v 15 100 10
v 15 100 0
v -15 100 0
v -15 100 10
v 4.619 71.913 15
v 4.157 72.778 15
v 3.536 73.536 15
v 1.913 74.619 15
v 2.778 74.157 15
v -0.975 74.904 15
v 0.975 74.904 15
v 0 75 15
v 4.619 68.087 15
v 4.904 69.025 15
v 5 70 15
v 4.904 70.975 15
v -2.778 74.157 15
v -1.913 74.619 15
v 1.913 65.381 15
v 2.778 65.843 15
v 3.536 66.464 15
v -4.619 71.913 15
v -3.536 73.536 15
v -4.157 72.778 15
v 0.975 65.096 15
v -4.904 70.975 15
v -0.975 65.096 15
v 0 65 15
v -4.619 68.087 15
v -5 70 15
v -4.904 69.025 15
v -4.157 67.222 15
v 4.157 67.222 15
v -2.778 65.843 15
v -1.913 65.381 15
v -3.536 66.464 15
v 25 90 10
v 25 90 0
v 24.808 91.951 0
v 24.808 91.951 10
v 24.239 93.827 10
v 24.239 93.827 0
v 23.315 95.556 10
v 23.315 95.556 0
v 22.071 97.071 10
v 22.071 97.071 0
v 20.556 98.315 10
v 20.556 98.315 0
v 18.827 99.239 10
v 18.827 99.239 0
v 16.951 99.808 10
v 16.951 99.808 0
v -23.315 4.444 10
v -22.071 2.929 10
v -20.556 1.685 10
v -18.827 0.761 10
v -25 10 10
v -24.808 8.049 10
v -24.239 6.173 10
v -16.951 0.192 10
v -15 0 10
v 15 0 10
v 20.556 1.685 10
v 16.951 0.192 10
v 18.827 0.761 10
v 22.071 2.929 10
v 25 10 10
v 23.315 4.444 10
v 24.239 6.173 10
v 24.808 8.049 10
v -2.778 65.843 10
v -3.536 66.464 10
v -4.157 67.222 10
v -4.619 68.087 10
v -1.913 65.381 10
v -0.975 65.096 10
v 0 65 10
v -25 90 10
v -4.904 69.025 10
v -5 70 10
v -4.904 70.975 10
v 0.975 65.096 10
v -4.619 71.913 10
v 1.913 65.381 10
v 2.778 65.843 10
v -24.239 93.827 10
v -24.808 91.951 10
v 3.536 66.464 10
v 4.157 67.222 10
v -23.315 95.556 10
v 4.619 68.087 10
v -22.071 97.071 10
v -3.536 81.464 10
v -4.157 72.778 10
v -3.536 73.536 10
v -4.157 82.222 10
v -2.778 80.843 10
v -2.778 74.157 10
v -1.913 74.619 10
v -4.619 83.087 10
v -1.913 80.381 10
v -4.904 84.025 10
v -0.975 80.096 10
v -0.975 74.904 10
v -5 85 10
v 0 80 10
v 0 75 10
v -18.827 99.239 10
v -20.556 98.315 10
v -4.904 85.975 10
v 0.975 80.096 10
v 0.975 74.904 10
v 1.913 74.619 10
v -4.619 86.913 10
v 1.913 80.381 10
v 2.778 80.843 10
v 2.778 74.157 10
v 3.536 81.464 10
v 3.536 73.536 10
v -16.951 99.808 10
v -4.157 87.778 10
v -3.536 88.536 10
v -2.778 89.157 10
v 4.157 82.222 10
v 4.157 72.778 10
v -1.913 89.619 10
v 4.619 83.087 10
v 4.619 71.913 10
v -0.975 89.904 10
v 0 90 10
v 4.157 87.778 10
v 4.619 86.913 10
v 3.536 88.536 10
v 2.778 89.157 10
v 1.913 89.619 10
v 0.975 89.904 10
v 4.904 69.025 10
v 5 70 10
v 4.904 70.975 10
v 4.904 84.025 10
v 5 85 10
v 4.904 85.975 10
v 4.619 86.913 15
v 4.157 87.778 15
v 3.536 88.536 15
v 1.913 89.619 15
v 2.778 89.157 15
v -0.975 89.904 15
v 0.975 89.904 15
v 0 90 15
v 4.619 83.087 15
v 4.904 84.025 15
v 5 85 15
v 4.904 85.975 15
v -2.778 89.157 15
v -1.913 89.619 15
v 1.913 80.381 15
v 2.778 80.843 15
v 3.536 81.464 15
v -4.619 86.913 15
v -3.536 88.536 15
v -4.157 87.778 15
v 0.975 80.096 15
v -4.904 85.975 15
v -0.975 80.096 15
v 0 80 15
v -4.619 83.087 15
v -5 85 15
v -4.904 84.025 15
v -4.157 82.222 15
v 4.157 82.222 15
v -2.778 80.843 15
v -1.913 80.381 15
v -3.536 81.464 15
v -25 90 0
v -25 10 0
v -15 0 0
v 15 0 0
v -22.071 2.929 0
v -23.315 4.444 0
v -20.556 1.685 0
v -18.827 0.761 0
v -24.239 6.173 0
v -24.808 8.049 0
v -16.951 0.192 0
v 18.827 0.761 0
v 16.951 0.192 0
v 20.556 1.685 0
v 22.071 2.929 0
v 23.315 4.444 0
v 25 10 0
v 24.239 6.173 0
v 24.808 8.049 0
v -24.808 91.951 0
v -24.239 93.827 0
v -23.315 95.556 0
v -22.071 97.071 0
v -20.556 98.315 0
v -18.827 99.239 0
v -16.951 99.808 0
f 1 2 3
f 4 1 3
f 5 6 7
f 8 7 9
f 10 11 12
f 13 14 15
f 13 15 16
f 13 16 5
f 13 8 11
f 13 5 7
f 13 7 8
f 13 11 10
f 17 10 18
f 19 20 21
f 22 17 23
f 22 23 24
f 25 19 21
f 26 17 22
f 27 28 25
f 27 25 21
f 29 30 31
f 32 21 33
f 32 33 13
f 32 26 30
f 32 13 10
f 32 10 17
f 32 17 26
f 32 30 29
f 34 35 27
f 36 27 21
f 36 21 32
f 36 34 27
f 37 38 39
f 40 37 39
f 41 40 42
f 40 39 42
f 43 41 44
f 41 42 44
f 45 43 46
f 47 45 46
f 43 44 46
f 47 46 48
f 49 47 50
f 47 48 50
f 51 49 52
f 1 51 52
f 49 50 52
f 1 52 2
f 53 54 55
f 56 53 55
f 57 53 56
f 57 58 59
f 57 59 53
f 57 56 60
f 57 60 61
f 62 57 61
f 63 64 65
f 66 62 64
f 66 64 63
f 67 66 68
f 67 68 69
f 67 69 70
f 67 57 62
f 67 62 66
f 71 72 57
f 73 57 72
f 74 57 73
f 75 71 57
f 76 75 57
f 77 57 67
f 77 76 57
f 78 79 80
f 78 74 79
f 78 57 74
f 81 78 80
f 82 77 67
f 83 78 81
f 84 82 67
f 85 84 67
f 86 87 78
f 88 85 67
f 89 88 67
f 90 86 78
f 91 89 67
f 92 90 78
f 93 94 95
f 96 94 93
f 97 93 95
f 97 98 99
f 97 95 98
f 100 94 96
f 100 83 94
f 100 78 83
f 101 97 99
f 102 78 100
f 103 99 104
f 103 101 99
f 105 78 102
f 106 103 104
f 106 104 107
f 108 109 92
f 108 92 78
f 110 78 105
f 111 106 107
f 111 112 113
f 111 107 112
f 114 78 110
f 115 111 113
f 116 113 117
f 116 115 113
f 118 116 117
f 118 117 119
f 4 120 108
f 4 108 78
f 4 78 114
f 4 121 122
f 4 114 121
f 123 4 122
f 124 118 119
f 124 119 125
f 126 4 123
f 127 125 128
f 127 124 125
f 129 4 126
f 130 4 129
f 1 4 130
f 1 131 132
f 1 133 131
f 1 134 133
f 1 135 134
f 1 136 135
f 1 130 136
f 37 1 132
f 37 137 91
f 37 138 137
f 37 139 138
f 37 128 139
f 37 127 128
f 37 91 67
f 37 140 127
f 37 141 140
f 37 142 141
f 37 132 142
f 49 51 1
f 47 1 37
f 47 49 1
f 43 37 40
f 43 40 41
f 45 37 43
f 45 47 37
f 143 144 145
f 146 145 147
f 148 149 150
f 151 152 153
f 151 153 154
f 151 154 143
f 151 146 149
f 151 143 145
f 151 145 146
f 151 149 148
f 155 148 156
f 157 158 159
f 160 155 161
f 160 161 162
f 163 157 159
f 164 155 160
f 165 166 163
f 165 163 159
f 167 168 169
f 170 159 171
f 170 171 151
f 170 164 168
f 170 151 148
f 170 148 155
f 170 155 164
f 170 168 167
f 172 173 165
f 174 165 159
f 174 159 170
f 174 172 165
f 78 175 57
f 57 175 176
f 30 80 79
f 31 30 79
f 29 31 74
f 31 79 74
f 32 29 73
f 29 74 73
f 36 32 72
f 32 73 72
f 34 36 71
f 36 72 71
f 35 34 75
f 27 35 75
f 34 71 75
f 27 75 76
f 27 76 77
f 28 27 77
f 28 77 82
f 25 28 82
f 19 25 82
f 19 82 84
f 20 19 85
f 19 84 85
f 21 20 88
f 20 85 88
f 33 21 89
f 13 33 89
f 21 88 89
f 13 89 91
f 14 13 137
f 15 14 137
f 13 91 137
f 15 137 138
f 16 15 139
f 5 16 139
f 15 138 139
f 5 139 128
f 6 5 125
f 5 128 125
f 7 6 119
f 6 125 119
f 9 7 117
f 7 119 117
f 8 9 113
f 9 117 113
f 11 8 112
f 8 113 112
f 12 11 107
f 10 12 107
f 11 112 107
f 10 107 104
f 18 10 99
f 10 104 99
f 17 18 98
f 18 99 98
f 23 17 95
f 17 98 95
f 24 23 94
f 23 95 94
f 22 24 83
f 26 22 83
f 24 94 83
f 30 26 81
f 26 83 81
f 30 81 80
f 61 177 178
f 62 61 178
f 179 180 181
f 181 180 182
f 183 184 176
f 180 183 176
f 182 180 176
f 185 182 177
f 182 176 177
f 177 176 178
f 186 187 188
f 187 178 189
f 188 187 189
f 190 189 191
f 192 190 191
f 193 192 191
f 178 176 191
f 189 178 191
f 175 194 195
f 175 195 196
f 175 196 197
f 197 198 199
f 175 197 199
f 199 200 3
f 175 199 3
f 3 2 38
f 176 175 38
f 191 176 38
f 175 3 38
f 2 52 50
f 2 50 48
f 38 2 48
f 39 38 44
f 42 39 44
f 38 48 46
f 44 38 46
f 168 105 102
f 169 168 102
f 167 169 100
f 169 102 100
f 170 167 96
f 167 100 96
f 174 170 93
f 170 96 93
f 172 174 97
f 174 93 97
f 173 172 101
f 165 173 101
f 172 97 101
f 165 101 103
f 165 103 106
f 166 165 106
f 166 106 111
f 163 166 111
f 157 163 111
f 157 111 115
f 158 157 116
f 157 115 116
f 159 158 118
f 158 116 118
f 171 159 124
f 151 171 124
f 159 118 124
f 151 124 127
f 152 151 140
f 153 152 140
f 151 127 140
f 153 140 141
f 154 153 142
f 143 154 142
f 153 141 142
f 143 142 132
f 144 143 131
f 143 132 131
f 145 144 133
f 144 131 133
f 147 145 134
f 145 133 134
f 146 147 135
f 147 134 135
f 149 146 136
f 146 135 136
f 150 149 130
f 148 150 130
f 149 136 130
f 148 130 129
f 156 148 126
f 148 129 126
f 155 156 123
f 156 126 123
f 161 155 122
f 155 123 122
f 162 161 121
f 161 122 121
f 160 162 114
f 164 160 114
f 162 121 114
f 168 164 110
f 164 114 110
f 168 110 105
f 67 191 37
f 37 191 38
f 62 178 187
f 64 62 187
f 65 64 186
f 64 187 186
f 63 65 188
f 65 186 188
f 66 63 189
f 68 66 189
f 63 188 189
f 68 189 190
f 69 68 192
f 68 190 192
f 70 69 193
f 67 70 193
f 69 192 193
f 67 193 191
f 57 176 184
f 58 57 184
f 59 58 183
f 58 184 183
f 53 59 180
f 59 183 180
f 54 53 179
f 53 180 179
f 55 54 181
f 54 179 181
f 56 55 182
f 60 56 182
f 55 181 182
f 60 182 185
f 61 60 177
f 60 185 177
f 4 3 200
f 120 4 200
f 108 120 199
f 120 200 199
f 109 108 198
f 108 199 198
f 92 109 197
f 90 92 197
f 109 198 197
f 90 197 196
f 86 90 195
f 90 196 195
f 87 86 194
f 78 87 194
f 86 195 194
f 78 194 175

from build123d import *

# Parameters (mm, degrees)
BOSS_EXTRU_1_DEPTH = 10
ESQUISSE2_R        = 5
BOSS_EXTRU_2_DEPTH = 5


with BuildPart() as part:
    # Esquisse1 → Boss.-Extru.1 (new body)
    with BuildSketch(Plane.XY):
        with BuildLine():
            Line((-15, 0), (15, 0))
            ThreePointArc((15, 0), (22.071067812, 2.928932188), (25, 10))
            Line((25, 10), (25, 90))
            ThreePointArc((25, 90), (22.071067812, 97.071067812), (15, 100))
            Line((15, 100), (-15, 100))
            ThreePointArc((-15, 100), (-22.071067812, 97.071067812), (-25, 90))
            Line((-25, 90), (-25, 10))
            ThreePointArc((-25, 10), (-22.071067812, 2.928932188), (-15, 0))
        make_face()
    extrude(amount=BOSS_EXTRU_1_DEPTH)

    # Esquisse2 → Boss.-Extru.2 (add)
    with BuildSketch(Plane.XY.offset(10)):
        with Locations(Location((0, 85, 0), (0, 0, 180))):
            Circle(ESQUISSE2_R)
        with Locations(Location((0, 70, 0), (0, 0, 180))):
            Circle(ESQUISSE2_R)
    extrude(amount=BOSS_EXTRU_2_DEPTH)


solid = part.part
